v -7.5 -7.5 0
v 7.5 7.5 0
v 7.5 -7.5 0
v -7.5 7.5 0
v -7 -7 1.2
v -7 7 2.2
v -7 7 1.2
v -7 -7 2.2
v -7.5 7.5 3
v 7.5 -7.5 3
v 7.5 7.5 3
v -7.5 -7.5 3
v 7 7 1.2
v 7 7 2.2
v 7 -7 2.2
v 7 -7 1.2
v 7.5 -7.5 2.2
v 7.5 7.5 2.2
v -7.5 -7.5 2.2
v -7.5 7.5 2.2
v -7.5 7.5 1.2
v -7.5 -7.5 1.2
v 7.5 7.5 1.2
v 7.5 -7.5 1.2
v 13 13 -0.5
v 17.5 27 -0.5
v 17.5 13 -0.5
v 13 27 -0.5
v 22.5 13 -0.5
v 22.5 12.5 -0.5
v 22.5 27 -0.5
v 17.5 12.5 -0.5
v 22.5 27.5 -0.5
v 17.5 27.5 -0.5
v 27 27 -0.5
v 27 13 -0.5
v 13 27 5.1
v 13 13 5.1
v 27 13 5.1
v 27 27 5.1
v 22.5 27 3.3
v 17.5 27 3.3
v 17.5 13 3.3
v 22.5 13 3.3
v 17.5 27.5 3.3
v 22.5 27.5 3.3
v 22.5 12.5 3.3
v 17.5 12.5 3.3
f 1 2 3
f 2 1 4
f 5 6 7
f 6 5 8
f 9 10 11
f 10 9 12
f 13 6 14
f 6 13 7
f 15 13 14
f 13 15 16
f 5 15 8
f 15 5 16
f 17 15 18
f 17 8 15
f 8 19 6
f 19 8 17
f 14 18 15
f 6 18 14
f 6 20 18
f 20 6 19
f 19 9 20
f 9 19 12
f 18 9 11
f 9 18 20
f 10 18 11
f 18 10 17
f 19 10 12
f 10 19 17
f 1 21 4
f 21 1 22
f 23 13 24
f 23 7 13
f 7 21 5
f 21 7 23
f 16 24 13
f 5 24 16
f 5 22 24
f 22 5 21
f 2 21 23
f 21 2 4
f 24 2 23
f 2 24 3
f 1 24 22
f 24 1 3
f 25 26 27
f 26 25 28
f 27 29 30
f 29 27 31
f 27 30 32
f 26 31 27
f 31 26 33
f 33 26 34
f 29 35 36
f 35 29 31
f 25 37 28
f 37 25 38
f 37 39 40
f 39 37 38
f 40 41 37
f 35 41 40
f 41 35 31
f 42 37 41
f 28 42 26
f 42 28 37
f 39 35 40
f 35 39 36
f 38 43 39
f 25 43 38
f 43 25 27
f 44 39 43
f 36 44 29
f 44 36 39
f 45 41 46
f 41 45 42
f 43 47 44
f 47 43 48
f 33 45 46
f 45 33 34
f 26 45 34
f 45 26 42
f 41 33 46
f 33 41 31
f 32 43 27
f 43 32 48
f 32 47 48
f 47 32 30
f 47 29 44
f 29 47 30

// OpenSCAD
// Thrice V1
//
// A Split Mechanical Keyboard

// Level of detail
$fn = 128;

module mirror2(vector) {
  children();
  mirror(vector) children();
}

module array (count, distance) {
  for (i=[0:1:count-1]) {
    translate([0,distance*i,0])
      children();
  }
}

module turn (degree) {
  rotate([0,0,degree])
    children();
}

// All constants are in mm
key_side = 15;
plate_thickness = 3;
feet_thickness = 0.9;

module key_holder () {
    lip_thickness = 0.8;
    lip_overhang = 0.5;
    trench_thickness = 1.2;
    lip_total = 2*lip_overhang;
    union() {
      // hole
      linear_extrude(plate_thickness) {
        square(key_side - lip_total, center=true);
      }
      translate([0,0,plate_thickness - lip_thickness]) {
        linear_extrude(lip_thickness) {
          square(key_side, center=true);
        }
      }
      linear_extrude(trench_thickness) {
        square(key_side, center=true);
      }
    }
}

key_holder();

//
// OLD
//

height = 4.6;
feet_height = 8;
wall = 4;
pcb_height = 1.2;
mountin_hole = 3;
membrane = 1;
key_distance = 19;
key_hole = 14;
key_tab_indent = 0.5;
key_tab_width = 5.0;
key_tab_submersion = 1.3;

module keyholder () {
  margin = 0.5;
  h = height+(2*margin);
  translate([0,0,-0.5]) {
    union() {
      // hole
      linear_extrude(h) {
        square(key_hole, center=true);
      }
      // botton indent for lock
      #linear_extrude(h-margin-key_tab_submersion) {
        mirror2([0,1,0]) {
          translate([0,-(key_hole+key_tab_indent)/2,0]) {
            square([key_tab_width,key_tab_indent], center=true);
          }
        }
      }
    }
  }
}

// OLD for comparison
translate([20,20,0]) {
  keyholder();
}

module key (units) {
  union() {
    keyholder();
    // Outline of keycap, hidden by default
    *translate([0,0,height-1]) {
      linear_extrude(2) {
        square([key_distance*units-1,key_distance-1], center=true);
      }
    }
  }
}


module two_keys () {
  array(2, key_distance)
    key(1);
}

module three_keys () {
  array(3, key_distance)
    key(1);
}

module four_keys () {
  three_keys();
  translate([key_distance,key_distance,0]) turn(90) key(1.5);
}

module five_keys () {
  three_keys();
  translate([key_distance,key_distance/2,0]) two_keys();
}

module index_finger_full () {
  turn(15) mirror([1,0,0]) five_keys();
}

module middle_finger () {
  turn(15) three_keys();
}

module ring_finger () {
  turn(15) three_keys();
}

module pinky_full () {
  turn(15) four_keys();
}

module thumbs () {
  translate([71.7,80]) turn(-75) key(1.5);
  translate([50,68]) turn(15) key(1);
  translate([31.5,63]) turn(-75) key(1.5);
  translate([13,58]) turn(-75) key(1);
}

module right_hand () {
  translate([49,89,0]) index_finger_full();
  translate([65.5,103,0]) middle_finger();
  translate([86.5,99,0]) ring_finger();
  translate([108,93,0]) pinky_full();
  thumbs();
}

module plate_2d () {
  minkowski() {
    difference() {
      union() {
        translate([8,46,0]) square([100,82]);
        translate([82,104]) circle(50);
      }
      translate([98,-33,0]) circle(100);
    }
    circle(7);
  }
}

module interior_2d () {
  offset(-wall) plate_2d();
}

module interior_3d () {
  translate([0,0,-0.5]) {
    linear_extrude(feet_height+0.5) {
      interior_2d();
    }
  }
}

module plate_3d () {
  difference() {
    linear_extrude(height+feet_height) {
      plate_2d();
    }
    interior_3d();
  }
}

module right_side () {
  difference() {
    plate_3d();
    translate([3,-3,feet_height]) right_hand();
  }
}

module left_side () {
  mirror([1,0,0]) right_side();
}

// Complete 2D area without holes
module complete_2d () {
  difference () {
    union () {
      mirror2([1,0,0]) plate_2d();
      translate([0,87,0]) square([35,96], center=true);
    }
    *translate([0,133,0]) square([38,10], center=true);
    *translate([-18,150,0]) circle(22);
    *translate([18,150,0]) circle(22);
  }
}

*complete_2d();

module standoff () {
  difference() {
    translate([0,0,pcb_height]) {
      linear_extrude(membrane) circle(mountin_hole / 2 + 1);
    }
    translate([0,0,-1]) {
      linear_extrude(pcb_height + membrane + 2) 
        circle(mountin_hole / 2 - 0.1);
    }
  }
}

module standoffs_placement () {
  mirror2([1,0,0]) {
    translate([36,49,0]) children();
    translate([93,84,0]) children();
    translate([115,125,0]) children();
    translate([70,143,0]) children();
    translate([24,122,0]) children();
  }
}

module standoffs () {
  standoffs_placement() {
    standoff();
  }
}

module complete_interior_3d () {
  translate([0,0,-0.5]) {
    difference() {
      linear_extrude(feet_height+0.5+membrane) {
        offset(-wall) complete_2d();
      }
      translate([0,0,feet_height-0.5]) standoffs();
    }
  }
}

module complete_keyboard_3d () {
  difference() {
    linear_extrude(height+feet_height) {
      complete_2d();
    }
    complete_interior_3d();
  }
}

module keyboard () {
  difference () {
    complete_keyboard_3d();
    mirror2([1,0,0]) {
      translate([3,-3,feet_height]) right_hand();
    }
  }
}

*keyboard();

module holes () {
  standoffs_placement() {
    translate([0,0,-1]) {
      linear_extrude(height + membrane - 1) 
        circle(mountin_hole / 2 - 0.1);
    }    
  }
}

module plate () {
  difference() {
    union() {
      translate([0,0,membrane])
      difference() {
        linear_extrude(height-membrane) {
          complete_2d();
        }
        // cut out for flat cable
        translate([0,0,-1]) {
          linear_extrude(height-membrane + 2) {
            translate([0,65,0]) square([12,8], center=true);
          }
        }
        // cut out for USB plug
        translate([0,0,-2]) {
          linear_extrude(height-membrane) {
            translate([0,135,0]) square([15,10], center=true);
          }
        }
      }  
      translate([0,0,-membrane]) standoffs();
    }
    holes();
    mirror2([1,0,0]) {
      translate([3,-3,0]) right_hand();
    }
  }
}

// top plate for 3D printing
*plate();

// trackpad
*translate([0,85,0]) circle(20);


module pcb () {
  linear_extrude(pcb_height) {
    difference() {
      offset(-wall-1) complete_2d();
      projection(cut=true) holes();
    }
  }
}

// guide for placing the switches & holes on the pcb
*projection() difference() {
  pcb();
  mirror2([1,0,0]) {
    translate([3,-3,-key_tab_submersion/2]) right_hand();
  }
}

// pcb outline
*projection() {
  linear_extrude(pcb_height) {
    offset(-wall-1) complete_2d();
  }
}
